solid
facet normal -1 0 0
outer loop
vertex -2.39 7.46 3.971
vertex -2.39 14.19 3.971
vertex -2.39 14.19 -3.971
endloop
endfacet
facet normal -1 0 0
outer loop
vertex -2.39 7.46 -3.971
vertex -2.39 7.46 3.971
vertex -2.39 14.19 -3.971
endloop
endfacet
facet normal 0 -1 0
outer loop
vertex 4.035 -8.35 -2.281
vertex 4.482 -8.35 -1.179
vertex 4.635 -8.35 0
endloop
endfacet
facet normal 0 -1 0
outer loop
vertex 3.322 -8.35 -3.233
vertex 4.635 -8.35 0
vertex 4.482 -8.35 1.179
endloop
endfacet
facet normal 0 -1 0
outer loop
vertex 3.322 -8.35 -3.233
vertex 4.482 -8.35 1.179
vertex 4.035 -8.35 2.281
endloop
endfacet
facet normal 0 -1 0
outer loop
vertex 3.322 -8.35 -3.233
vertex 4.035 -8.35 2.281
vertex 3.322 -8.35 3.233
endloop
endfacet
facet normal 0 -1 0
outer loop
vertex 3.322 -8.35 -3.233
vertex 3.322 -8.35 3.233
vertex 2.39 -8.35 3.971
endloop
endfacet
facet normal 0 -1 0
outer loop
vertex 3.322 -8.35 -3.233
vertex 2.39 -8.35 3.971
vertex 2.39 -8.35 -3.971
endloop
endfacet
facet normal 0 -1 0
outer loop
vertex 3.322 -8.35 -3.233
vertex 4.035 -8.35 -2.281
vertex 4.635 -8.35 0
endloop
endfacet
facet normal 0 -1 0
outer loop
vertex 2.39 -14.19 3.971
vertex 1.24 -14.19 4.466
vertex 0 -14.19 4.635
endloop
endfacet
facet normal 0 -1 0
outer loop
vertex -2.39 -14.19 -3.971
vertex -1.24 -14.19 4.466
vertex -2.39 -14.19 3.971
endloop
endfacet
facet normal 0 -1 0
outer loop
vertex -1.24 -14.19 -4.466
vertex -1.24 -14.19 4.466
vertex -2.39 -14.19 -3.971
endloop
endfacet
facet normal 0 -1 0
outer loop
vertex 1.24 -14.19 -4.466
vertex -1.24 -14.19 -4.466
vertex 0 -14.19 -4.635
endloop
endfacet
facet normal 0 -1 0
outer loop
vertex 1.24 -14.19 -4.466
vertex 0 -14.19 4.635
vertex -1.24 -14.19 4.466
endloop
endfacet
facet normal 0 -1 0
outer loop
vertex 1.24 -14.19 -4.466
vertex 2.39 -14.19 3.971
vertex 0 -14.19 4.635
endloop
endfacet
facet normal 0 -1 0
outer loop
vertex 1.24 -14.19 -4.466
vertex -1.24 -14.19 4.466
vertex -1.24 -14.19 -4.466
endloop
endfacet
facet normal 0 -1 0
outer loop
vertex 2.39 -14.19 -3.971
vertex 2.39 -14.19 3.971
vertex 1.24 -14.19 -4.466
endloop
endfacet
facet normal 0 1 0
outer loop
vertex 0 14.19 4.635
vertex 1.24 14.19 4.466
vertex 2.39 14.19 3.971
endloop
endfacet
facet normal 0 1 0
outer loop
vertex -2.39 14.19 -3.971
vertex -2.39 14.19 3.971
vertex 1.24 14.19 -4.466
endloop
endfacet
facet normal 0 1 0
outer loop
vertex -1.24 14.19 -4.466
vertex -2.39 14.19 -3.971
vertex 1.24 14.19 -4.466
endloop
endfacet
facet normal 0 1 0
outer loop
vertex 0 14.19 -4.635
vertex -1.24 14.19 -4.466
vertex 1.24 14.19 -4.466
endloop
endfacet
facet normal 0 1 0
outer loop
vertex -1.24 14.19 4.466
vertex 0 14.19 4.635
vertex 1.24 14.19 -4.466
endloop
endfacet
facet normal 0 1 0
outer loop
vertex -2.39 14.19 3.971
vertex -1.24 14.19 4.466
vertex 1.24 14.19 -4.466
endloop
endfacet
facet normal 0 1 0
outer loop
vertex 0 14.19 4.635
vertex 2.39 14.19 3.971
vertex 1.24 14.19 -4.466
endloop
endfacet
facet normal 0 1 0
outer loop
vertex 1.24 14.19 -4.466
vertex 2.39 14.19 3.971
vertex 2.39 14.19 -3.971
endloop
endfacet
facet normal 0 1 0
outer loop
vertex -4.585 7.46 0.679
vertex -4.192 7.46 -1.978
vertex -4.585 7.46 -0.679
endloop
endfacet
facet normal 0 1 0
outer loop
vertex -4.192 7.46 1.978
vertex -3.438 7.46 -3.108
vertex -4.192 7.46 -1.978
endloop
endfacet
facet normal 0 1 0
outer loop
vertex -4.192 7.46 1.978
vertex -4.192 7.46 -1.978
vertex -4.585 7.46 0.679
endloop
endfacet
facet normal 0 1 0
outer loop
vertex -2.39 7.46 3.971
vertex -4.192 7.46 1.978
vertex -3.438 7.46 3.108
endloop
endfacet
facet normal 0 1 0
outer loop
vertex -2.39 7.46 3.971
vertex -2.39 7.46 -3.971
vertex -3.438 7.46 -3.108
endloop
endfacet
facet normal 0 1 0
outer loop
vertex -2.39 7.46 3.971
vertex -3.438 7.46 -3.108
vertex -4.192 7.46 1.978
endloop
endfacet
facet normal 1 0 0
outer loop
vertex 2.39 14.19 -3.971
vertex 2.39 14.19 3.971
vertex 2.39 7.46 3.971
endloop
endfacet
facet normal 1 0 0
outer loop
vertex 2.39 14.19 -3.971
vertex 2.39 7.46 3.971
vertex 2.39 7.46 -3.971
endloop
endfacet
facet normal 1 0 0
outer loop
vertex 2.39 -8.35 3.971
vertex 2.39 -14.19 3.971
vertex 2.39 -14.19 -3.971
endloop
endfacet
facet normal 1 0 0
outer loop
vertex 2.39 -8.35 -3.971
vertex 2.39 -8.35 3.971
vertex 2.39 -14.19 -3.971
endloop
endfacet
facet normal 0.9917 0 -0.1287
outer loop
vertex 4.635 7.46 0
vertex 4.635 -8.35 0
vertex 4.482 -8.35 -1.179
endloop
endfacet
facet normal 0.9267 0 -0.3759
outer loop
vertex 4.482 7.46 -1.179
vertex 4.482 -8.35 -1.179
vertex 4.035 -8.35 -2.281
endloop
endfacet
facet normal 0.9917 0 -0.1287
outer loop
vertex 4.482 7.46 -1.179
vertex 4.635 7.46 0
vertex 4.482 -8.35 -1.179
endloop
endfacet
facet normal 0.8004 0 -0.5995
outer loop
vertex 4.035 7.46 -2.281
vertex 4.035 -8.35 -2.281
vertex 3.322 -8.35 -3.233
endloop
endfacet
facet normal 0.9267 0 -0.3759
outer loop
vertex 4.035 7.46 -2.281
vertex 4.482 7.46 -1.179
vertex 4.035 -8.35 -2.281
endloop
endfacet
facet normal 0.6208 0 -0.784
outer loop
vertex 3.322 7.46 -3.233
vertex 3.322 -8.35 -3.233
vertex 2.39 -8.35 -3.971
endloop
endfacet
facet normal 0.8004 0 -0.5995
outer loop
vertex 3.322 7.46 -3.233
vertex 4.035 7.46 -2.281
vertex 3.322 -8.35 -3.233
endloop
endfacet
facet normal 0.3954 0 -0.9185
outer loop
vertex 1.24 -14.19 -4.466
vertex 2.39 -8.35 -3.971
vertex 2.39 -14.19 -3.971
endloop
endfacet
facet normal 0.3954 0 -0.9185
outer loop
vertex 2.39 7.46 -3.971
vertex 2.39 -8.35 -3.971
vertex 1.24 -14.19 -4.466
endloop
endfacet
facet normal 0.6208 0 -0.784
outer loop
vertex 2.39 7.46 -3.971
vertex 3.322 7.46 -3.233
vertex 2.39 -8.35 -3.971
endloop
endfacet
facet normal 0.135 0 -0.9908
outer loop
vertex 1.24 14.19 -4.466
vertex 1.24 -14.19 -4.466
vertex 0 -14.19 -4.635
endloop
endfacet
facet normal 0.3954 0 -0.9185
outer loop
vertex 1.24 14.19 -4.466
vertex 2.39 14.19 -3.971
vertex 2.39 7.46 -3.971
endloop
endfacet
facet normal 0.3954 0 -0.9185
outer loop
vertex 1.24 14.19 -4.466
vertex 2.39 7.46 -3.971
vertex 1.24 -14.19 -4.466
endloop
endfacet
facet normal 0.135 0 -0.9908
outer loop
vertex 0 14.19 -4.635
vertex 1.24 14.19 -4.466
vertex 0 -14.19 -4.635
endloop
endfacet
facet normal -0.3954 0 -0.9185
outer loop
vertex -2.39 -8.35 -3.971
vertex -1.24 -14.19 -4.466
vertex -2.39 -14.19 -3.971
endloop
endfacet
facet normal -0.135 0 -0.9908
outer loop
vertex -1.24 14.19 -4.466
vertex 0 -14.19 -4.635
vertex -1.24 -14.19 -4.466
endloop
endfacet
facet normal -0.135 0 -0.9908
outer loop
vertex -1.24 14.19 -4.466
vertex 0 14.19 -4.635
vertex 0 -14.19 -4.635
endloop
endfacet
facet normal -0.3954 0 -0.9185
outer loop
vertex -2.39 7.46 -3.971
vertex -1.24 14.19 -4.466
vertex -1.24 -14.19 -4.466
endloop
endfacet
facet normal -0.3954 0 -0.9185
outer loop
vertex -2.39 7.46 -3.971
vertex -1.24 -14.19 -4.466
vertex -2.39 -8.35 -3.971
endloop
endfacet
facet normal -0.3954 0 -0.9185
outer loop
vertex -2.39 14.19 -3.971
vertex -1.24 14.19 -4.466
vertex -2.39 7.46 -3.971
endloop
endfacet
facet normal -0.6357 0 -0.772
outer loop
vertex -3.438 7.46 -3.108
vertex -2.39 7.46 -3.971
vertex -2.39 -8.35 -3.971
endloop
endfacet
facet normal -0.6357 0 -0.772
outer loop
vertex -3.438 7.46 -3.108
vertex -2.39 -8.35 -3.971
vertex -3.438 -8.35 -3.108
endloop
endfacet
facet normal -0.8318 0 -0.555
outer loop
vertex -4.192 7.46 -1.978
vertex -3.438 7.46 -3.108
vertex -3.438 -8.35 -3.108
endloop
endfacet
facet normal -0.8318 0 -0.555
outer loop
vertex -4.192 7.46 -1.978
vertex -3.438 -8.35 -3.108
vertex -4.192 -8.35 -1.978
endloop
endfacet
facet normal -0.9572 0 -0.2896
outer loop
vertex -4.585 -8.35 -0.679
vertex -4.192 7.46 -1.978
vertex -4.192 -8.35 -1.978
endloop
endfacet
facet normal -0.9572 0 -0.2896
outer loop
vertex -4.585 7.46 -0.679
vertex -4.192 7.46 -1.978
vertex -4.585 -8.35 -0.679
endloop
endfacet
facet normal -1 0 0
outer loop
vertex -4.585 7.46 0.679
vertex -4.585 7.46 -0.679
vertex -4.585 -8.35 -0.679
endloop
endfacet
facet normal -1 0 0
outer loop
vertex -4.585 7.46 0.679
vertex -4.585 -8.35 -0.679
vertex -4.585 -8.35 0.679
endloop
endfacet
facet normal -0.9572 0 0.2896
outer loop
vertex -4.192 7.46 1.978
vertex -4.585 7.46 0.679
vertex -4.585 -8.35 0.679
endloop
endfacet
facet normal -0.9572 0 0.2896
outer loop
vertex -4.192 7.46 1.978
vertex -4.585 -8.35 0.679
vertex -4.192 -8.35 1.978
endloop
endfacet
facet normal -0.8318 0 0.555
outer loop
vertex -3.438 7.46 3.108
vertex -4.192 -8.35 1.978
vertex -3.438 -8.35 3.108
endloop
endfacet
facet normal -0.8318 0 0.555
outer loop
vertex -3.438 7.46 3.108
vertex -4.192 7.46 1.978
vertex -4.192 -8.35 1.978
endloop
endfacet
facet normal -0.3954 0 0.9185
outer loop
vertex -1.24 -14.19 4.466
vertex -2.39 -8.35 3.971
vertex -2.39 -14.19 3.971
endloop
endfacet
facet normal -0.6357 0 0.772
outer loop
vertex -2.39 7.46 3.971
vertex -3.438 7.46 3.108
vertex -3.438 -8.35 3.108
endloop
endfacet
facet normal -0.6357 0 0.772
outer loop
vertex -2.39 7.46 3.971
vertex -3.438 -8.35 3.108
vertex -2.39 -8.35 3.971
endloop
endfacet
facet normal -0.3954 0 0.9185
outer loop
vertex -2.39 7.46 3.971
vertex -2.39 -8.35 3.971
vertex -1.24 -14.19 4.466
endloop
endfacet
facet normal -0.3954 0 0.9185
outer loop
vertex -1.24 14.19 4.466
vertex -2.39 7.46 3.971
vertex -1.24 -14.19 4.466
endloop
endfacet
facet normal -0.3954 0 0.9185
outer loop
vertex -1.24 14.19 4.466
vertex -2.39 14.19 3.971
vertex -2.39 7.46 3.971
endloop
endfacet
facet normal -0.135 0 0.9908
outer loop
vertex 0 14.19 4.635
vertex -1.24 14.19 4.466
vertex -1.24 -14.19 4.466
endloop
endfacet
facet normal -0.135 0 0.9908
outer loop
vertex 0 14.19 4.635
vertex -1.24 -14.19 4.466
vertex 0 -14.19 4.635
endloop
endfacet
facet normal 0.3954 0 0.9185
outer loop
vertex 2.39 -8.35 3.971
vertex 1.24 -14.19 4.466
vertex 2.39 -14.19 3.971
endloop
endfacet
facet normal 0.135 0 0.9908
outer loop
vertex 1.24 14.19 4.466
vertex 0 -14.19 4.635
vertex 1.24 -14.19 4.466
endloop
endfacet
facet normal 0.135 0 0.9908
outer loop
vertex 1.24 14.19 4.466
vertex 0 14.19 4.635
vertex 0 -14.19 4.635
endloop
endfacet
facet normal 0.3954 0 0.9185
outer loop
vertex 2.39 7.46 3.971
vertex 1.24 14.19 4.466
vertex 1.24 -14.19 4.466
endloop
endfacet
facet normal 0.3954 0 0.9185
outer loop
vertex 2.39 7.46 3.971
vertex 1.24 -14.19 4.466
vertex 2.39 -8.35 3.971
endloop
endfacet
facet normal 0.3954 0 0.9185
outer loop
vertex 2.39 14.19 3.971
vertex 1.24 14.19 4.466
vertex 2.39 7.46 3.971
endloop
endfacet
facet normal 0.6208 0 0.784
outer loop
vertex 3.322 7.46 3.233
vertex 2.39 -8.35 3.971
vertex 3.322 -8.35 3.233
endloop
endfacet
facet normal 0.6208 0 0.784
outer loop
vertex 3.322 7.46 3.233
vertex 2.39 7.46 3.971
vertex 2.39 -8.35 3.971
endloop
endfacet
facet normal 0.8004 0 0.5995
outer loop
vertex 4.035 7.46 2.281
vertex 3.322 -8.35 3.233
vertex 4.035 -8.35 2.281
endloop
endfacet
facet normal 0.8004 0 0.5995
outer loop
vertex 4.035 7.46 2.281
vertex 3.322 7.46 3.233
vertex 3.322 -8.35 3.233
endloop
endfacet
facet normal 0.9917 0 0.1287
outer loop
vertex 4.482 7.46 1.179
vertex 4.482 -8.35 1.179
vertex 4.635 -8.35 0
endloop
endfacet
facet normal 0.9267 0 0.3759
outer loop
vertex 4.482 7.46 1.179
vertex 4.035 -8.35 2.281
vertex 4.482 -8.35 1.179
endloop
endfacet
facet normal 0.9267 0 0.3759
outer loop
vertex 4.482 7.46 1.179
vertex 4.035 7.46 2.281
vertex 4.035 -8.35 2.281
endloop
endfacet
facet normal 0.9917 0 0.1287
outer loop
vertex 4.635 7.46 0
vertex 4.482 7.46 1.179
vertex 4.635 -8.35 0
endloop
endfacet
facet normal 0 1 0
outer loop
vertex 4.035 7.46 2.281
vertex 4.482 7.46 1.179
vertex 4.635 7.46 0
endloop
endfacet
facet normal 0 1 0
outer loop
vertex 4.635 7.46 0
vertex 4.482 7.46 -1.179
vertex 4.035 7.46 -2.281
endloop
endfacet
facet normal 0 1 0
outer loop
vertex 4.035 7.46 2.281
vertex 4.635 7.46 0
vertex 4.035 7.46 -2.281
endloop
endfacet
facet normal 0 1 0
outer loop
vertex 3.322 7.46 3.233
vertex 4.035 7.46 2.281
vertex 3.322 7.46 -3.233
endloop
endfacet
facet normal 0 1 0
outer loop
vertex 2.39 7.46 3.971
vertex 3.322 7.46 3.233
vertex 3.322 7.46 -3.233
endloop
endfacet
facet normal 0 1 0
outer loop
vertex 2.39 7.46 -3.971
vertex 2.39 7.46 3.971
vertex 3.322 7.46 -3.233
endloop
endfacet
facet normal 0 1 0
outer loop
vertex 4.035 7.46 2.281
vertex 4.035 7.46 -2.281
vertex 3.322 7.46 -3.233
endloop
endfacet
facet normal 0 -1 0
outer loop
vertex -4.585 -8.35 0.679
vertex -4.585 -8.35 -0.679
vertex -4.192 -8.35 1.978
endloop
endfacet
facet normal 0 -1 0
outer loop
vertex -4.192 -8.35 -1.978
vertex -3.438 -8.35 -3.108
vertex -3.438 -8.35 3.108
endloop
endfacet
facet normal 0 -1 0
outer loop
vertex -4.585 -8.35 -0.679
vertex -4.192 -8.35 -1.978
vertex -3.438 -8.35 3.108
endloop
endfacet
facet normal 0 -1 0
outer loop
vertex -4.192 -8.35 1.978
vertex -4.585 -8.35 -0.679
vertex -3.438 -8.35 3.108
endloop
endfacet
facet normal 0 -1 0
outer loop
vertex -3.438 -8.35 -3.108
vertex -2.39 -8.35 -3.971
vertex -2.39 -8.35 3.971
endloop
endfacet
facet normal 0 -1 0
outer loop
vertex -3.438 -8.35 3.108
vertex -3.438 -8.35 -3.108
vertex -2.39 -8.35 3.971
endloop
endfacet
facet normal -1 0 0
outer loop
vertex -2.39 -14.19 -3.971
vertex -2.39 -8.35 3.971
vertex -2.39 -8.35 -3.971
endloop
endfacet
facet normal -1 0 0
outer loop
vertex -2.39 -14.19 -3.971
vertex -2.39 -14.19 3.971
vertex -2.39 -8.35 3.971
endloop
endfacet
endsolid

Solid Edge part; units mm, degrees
sketch "Sketch1" plane through (0, 0, 0) normal (0, -1, 0) x (1, 0, 0)
  circle A0 centre (0, 0) radius 4.635
extrude "Protrusion1" add sketch "Sketch1" along normal mid plane 28.38
sketch "Sketch2" plane through (0, -14.19, 0) normal (0, -1, 0) x (1, 0, 0)
  line L0 (-2.39, 3.9713) -> (-2.39, -3.9713)
  arc A0 (-2.39, -3.9713) -> (-2.39, 3.9713) centre (0, 0) cw
  line L1 (2.39, 3.9713) -> (2.39, -3.9713)
  arc A1 (2.39, -3.9713) -> (2.39, 3.9713) centre (0, 0) ccw
extrude "Enlèvement_matière_1" cut sketch "Sketch2" against normal blind 5.84
sketch "Sketch3" plane through (0, 14.19, 0) normal (0, 1, 0) x (-1, 0, 0)
  line L0 (-2.39, 3.9713) -> (-2.39, -3.9713)
  arc A0 (-2.39, -3.9713) -> (-2.39, 3.9713) centre (0, 0) cw
  line L1 (2.39, 3.9713) -> (2.39, -3.9713)
  arc A1 (2.39, 3.9713) -> (2.39, -3.9713) centre (0, 0) cw
extrude "Enlèvement_matière_2" cut sketch "Sketch3" against normal blind 6.73
